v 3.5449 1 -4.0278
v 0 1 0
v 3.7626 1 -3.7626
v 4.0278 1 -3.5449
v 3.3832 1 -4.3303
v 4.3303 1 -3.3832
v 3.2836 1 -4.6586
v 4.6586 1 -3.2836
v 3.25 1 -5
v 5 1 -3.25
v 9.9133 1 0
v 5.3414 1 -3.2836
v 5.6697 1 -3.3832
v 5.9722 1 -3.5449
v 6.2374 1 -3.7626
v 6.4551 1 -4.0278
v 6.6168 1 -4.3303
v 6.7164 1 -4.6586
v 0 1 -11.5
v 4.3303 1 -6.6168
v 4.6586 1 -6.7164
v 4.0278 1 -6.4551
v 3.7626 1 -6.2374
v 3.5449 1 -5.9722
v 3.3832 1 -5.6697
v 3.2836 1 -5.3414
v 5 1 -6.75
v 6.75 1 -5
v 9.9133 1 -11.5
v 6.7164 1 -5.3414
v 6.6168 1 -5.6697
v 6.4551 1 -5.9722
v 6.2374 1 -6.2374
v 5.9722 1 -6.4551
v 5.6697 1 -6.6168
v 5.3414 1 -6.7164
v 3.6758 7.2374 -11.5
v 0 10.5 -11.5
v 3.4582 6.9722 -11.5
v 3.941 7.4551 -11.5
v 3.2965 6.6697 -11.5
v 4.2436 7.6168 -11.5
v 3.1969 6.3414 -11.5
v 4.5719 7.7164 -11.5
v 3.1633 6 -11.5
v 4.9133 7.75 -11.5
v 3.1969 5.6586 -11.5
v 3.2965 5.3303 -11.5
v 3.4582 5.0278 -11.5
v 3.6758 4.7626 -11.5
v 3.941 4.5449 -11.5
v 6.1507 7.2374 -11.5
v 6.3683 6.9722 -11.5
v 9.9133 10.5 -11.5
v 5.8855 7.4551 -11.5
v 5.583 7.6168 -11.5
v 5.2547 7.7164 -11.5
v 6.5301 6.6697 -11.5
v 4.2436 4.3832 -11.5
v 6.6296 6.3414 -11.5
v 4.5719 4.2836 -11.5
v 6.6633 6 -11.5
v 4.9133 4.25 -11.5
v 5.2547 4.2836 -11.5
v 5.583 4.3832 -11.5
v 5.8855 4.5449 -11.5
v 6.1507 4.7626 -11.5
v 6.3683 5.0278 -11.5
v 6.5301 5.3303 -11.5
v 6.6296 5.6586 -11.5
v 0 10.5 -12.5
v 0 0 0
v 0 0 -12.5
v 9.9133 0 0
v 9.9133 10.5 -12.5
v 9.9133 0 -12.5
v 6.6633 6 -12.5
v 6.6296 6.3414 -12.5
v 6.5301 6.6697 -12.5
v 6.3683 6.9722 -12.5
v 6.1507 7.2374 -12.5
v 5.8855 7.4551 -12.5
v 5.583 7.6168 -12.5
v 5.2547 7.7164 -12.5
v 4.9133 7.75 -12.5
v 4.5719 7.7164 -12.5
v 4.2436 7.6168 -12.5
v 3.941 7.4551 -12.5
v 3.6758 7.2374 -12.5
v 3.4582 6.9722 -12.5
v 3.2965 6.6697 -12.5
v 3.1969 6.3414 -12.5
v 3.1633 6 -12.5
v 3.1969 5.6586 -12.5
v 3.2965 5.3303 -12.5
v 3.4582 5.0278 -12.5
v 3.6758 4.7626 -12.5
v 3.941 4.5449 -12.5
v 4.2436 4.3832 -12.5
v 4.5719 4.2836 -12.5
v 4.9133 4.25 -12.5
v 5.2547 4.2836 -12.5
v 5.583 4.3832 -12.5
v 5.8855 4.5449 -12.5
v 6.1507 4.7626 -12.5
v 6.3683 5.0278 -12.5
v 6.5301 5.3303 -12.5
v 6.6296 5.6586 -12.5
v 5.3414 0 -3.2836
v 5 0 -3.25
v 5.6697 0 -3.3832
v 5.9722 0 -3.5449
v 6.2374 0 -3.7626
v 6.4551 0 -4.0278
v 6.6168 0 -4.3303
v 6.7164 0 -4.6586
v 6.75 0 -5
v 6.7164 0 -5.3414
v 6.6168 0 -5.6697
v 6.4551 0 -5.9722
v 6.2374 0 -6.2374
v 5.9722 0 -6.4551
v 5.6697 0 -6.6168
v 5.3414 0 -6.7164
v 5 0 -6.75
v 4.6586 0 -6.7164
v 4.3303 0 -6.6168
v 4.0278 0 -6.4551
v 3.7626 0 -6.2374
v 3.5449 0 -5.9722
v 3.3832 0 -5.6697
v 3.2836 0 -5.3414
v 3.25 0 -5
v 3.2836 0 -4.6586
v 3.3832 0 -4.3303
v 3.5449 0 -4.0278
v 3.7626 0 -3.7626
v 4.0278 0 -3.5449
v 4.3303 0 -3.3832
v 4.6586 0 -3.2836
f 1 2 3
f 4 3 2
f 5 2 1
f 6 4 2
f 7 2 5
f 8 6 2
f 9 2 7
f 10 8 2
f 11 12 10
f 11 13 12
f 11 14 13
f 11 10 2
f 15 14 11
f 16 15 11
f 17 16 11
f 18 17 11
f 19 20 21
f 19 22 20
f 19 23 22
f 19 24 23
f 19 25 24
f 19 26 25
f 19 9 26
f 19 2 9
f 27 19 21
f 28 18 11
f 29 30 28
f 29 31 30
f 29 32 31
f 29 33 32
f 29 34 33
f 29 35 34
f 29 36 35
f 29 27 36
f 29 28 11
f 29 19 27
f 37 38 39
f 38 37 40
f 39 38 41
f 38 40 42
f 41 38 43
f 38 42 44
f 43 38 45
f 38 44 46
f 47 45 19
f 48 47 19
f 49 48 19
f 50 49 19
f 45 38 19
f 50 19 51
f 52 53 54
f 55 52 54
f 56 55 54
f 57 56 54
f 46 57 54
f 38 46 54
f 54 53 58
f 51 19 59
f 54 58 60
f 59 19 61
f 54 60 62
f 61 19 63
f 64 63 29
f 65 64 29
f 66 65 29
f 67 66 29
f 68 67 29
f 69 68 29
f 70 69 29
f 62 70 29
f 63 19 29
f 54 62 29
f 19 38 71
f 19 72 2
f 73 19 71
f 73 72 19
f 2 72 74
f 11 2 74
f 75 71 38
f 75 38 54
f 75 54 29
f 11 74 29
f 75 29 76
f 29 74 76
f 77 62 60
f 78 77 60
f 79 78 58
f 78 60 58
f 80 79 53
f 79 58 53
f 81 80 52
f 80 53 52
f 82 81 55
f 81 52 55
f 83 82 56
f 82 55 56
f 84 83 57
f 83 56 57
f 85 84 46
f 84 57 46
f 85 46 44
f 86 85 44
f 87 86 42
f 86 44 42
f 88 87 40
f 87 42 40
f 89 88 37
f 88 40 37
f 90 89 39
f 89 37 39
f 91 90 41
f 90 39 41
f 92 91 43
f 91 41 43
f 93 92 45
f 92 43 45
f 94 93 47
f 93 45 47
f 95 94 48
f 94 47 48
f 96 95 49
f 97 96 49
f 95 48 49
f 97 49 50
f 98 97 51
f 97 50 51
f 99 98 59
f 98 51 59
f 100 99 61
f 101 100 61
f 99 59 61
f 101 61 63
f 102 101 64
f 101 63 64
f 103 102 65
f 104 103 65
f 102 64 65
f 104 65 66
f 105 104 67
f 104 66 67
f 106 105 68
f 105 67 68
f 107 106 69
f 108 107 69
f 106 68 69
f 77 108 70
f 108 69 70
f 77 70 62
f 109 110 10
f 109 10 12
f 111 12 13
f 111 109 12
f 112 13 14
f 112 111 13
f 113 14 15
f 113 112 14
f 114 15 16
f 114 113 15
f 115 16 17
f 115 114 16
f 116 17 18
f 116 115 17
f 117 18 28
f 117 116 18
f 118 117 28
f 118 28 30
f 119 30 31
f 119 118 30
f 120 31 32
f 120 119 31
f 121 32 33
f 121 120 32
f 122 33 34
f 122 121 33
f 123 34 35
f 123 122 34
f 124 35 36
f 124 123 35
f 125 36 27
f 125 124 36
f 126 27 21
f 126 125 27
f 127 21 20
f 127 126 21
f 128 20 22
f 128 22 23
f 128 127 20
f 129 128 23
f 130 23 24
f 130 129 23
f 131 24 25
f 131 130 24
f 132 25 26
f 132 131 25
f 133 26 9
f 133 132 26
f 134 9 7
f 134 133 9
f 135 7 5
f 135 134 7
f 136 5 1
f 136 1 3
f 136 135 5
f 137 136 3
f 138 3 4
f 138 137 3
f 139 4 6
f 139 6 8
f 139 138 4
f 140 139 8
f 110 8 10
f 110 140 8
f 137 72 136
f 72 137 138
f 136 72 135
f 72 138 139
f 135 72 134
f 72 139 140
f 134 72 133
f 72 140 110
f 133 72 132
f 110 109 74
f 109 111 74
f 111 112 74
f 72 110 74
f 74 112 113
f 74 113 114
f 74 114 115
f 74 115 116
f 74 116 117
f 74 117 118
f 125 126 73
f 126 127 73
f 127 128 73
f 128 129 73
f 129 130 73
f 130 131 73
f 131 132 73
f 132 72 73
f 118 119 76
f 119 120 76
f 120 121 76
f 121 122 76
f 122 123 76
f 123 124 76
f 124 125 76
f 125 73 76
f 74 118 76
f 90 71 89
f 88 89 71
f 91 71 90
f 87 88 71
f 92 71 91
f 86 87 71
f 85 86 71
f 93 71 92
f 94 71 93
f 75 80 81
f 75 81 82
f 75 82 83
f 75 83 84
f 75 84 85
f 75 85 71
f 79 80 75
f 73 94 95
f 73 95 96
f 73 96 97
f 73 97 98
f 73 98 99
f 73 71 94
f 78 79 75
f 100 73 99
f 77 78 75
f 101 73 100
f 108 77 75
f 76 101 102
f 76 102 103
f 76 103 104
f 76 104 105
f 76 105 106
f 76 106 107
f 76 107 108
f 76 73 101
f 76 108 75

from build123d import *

# Parameters (mm, degrees)
SKETCH1_W           = 9.91326949
SKETCH1_H           = 11.5
SKETCH1_R           = 1.75
BOSS_EXTRUDE3_DEPTH = 1
SKETCH1_5_W         = 9.91326949
SKETCH1_5_H         = 1
BOSS_EXTRUDE4_DEPTH = 10.5
SKETCH2_R           = 1.75
CUT_EXTRUDE1_DEPTH  = 1


with BuildPart() as part:
    # Sketch1 → Boss-Extrude3 (new body)
    with BuildSketch(Plane(origin=(0, 0, 0), x_dir=(1, 0, 0), z_dir=(0, 1, 0))):
        with Locations((4.956634745, 5.75)):
            Rectangle(SKETCH1_W, SKETCH1_H)
        with Locations((5, 5)):
            Circle(SKETCH1_R, mode=Mode.SUBTRACT)
    extrude(amount=BOSS_EXTRUDE3_DEPTH)

    # Sketch1<5> → Boss-Extrude4 (add)
    with BuildSketch(Plane(origin=(0, 0, 0), x_dir=(1, 0, 0), z_dir=(0, 1, 0))):
        with Locations((4.956634745, 12)):
            Rectangle(SKETCH1_5_W, SKETCH1_5_H)
    extrude(amount=BOSS_EXTRUDE4_DEPTH)

    # Sketch2 → Cut-Extrude1 (cut)
    with BuildSketch(Plane.XY.offset(-11.5)):
        with Locations((4.91326949, 6)):
            Circle(SKETCH2_R)
    extrude(amount=-CUT_EXTRUDE1_DEPTH, mode=Mode.SUBTRACT)


solid = part.part
